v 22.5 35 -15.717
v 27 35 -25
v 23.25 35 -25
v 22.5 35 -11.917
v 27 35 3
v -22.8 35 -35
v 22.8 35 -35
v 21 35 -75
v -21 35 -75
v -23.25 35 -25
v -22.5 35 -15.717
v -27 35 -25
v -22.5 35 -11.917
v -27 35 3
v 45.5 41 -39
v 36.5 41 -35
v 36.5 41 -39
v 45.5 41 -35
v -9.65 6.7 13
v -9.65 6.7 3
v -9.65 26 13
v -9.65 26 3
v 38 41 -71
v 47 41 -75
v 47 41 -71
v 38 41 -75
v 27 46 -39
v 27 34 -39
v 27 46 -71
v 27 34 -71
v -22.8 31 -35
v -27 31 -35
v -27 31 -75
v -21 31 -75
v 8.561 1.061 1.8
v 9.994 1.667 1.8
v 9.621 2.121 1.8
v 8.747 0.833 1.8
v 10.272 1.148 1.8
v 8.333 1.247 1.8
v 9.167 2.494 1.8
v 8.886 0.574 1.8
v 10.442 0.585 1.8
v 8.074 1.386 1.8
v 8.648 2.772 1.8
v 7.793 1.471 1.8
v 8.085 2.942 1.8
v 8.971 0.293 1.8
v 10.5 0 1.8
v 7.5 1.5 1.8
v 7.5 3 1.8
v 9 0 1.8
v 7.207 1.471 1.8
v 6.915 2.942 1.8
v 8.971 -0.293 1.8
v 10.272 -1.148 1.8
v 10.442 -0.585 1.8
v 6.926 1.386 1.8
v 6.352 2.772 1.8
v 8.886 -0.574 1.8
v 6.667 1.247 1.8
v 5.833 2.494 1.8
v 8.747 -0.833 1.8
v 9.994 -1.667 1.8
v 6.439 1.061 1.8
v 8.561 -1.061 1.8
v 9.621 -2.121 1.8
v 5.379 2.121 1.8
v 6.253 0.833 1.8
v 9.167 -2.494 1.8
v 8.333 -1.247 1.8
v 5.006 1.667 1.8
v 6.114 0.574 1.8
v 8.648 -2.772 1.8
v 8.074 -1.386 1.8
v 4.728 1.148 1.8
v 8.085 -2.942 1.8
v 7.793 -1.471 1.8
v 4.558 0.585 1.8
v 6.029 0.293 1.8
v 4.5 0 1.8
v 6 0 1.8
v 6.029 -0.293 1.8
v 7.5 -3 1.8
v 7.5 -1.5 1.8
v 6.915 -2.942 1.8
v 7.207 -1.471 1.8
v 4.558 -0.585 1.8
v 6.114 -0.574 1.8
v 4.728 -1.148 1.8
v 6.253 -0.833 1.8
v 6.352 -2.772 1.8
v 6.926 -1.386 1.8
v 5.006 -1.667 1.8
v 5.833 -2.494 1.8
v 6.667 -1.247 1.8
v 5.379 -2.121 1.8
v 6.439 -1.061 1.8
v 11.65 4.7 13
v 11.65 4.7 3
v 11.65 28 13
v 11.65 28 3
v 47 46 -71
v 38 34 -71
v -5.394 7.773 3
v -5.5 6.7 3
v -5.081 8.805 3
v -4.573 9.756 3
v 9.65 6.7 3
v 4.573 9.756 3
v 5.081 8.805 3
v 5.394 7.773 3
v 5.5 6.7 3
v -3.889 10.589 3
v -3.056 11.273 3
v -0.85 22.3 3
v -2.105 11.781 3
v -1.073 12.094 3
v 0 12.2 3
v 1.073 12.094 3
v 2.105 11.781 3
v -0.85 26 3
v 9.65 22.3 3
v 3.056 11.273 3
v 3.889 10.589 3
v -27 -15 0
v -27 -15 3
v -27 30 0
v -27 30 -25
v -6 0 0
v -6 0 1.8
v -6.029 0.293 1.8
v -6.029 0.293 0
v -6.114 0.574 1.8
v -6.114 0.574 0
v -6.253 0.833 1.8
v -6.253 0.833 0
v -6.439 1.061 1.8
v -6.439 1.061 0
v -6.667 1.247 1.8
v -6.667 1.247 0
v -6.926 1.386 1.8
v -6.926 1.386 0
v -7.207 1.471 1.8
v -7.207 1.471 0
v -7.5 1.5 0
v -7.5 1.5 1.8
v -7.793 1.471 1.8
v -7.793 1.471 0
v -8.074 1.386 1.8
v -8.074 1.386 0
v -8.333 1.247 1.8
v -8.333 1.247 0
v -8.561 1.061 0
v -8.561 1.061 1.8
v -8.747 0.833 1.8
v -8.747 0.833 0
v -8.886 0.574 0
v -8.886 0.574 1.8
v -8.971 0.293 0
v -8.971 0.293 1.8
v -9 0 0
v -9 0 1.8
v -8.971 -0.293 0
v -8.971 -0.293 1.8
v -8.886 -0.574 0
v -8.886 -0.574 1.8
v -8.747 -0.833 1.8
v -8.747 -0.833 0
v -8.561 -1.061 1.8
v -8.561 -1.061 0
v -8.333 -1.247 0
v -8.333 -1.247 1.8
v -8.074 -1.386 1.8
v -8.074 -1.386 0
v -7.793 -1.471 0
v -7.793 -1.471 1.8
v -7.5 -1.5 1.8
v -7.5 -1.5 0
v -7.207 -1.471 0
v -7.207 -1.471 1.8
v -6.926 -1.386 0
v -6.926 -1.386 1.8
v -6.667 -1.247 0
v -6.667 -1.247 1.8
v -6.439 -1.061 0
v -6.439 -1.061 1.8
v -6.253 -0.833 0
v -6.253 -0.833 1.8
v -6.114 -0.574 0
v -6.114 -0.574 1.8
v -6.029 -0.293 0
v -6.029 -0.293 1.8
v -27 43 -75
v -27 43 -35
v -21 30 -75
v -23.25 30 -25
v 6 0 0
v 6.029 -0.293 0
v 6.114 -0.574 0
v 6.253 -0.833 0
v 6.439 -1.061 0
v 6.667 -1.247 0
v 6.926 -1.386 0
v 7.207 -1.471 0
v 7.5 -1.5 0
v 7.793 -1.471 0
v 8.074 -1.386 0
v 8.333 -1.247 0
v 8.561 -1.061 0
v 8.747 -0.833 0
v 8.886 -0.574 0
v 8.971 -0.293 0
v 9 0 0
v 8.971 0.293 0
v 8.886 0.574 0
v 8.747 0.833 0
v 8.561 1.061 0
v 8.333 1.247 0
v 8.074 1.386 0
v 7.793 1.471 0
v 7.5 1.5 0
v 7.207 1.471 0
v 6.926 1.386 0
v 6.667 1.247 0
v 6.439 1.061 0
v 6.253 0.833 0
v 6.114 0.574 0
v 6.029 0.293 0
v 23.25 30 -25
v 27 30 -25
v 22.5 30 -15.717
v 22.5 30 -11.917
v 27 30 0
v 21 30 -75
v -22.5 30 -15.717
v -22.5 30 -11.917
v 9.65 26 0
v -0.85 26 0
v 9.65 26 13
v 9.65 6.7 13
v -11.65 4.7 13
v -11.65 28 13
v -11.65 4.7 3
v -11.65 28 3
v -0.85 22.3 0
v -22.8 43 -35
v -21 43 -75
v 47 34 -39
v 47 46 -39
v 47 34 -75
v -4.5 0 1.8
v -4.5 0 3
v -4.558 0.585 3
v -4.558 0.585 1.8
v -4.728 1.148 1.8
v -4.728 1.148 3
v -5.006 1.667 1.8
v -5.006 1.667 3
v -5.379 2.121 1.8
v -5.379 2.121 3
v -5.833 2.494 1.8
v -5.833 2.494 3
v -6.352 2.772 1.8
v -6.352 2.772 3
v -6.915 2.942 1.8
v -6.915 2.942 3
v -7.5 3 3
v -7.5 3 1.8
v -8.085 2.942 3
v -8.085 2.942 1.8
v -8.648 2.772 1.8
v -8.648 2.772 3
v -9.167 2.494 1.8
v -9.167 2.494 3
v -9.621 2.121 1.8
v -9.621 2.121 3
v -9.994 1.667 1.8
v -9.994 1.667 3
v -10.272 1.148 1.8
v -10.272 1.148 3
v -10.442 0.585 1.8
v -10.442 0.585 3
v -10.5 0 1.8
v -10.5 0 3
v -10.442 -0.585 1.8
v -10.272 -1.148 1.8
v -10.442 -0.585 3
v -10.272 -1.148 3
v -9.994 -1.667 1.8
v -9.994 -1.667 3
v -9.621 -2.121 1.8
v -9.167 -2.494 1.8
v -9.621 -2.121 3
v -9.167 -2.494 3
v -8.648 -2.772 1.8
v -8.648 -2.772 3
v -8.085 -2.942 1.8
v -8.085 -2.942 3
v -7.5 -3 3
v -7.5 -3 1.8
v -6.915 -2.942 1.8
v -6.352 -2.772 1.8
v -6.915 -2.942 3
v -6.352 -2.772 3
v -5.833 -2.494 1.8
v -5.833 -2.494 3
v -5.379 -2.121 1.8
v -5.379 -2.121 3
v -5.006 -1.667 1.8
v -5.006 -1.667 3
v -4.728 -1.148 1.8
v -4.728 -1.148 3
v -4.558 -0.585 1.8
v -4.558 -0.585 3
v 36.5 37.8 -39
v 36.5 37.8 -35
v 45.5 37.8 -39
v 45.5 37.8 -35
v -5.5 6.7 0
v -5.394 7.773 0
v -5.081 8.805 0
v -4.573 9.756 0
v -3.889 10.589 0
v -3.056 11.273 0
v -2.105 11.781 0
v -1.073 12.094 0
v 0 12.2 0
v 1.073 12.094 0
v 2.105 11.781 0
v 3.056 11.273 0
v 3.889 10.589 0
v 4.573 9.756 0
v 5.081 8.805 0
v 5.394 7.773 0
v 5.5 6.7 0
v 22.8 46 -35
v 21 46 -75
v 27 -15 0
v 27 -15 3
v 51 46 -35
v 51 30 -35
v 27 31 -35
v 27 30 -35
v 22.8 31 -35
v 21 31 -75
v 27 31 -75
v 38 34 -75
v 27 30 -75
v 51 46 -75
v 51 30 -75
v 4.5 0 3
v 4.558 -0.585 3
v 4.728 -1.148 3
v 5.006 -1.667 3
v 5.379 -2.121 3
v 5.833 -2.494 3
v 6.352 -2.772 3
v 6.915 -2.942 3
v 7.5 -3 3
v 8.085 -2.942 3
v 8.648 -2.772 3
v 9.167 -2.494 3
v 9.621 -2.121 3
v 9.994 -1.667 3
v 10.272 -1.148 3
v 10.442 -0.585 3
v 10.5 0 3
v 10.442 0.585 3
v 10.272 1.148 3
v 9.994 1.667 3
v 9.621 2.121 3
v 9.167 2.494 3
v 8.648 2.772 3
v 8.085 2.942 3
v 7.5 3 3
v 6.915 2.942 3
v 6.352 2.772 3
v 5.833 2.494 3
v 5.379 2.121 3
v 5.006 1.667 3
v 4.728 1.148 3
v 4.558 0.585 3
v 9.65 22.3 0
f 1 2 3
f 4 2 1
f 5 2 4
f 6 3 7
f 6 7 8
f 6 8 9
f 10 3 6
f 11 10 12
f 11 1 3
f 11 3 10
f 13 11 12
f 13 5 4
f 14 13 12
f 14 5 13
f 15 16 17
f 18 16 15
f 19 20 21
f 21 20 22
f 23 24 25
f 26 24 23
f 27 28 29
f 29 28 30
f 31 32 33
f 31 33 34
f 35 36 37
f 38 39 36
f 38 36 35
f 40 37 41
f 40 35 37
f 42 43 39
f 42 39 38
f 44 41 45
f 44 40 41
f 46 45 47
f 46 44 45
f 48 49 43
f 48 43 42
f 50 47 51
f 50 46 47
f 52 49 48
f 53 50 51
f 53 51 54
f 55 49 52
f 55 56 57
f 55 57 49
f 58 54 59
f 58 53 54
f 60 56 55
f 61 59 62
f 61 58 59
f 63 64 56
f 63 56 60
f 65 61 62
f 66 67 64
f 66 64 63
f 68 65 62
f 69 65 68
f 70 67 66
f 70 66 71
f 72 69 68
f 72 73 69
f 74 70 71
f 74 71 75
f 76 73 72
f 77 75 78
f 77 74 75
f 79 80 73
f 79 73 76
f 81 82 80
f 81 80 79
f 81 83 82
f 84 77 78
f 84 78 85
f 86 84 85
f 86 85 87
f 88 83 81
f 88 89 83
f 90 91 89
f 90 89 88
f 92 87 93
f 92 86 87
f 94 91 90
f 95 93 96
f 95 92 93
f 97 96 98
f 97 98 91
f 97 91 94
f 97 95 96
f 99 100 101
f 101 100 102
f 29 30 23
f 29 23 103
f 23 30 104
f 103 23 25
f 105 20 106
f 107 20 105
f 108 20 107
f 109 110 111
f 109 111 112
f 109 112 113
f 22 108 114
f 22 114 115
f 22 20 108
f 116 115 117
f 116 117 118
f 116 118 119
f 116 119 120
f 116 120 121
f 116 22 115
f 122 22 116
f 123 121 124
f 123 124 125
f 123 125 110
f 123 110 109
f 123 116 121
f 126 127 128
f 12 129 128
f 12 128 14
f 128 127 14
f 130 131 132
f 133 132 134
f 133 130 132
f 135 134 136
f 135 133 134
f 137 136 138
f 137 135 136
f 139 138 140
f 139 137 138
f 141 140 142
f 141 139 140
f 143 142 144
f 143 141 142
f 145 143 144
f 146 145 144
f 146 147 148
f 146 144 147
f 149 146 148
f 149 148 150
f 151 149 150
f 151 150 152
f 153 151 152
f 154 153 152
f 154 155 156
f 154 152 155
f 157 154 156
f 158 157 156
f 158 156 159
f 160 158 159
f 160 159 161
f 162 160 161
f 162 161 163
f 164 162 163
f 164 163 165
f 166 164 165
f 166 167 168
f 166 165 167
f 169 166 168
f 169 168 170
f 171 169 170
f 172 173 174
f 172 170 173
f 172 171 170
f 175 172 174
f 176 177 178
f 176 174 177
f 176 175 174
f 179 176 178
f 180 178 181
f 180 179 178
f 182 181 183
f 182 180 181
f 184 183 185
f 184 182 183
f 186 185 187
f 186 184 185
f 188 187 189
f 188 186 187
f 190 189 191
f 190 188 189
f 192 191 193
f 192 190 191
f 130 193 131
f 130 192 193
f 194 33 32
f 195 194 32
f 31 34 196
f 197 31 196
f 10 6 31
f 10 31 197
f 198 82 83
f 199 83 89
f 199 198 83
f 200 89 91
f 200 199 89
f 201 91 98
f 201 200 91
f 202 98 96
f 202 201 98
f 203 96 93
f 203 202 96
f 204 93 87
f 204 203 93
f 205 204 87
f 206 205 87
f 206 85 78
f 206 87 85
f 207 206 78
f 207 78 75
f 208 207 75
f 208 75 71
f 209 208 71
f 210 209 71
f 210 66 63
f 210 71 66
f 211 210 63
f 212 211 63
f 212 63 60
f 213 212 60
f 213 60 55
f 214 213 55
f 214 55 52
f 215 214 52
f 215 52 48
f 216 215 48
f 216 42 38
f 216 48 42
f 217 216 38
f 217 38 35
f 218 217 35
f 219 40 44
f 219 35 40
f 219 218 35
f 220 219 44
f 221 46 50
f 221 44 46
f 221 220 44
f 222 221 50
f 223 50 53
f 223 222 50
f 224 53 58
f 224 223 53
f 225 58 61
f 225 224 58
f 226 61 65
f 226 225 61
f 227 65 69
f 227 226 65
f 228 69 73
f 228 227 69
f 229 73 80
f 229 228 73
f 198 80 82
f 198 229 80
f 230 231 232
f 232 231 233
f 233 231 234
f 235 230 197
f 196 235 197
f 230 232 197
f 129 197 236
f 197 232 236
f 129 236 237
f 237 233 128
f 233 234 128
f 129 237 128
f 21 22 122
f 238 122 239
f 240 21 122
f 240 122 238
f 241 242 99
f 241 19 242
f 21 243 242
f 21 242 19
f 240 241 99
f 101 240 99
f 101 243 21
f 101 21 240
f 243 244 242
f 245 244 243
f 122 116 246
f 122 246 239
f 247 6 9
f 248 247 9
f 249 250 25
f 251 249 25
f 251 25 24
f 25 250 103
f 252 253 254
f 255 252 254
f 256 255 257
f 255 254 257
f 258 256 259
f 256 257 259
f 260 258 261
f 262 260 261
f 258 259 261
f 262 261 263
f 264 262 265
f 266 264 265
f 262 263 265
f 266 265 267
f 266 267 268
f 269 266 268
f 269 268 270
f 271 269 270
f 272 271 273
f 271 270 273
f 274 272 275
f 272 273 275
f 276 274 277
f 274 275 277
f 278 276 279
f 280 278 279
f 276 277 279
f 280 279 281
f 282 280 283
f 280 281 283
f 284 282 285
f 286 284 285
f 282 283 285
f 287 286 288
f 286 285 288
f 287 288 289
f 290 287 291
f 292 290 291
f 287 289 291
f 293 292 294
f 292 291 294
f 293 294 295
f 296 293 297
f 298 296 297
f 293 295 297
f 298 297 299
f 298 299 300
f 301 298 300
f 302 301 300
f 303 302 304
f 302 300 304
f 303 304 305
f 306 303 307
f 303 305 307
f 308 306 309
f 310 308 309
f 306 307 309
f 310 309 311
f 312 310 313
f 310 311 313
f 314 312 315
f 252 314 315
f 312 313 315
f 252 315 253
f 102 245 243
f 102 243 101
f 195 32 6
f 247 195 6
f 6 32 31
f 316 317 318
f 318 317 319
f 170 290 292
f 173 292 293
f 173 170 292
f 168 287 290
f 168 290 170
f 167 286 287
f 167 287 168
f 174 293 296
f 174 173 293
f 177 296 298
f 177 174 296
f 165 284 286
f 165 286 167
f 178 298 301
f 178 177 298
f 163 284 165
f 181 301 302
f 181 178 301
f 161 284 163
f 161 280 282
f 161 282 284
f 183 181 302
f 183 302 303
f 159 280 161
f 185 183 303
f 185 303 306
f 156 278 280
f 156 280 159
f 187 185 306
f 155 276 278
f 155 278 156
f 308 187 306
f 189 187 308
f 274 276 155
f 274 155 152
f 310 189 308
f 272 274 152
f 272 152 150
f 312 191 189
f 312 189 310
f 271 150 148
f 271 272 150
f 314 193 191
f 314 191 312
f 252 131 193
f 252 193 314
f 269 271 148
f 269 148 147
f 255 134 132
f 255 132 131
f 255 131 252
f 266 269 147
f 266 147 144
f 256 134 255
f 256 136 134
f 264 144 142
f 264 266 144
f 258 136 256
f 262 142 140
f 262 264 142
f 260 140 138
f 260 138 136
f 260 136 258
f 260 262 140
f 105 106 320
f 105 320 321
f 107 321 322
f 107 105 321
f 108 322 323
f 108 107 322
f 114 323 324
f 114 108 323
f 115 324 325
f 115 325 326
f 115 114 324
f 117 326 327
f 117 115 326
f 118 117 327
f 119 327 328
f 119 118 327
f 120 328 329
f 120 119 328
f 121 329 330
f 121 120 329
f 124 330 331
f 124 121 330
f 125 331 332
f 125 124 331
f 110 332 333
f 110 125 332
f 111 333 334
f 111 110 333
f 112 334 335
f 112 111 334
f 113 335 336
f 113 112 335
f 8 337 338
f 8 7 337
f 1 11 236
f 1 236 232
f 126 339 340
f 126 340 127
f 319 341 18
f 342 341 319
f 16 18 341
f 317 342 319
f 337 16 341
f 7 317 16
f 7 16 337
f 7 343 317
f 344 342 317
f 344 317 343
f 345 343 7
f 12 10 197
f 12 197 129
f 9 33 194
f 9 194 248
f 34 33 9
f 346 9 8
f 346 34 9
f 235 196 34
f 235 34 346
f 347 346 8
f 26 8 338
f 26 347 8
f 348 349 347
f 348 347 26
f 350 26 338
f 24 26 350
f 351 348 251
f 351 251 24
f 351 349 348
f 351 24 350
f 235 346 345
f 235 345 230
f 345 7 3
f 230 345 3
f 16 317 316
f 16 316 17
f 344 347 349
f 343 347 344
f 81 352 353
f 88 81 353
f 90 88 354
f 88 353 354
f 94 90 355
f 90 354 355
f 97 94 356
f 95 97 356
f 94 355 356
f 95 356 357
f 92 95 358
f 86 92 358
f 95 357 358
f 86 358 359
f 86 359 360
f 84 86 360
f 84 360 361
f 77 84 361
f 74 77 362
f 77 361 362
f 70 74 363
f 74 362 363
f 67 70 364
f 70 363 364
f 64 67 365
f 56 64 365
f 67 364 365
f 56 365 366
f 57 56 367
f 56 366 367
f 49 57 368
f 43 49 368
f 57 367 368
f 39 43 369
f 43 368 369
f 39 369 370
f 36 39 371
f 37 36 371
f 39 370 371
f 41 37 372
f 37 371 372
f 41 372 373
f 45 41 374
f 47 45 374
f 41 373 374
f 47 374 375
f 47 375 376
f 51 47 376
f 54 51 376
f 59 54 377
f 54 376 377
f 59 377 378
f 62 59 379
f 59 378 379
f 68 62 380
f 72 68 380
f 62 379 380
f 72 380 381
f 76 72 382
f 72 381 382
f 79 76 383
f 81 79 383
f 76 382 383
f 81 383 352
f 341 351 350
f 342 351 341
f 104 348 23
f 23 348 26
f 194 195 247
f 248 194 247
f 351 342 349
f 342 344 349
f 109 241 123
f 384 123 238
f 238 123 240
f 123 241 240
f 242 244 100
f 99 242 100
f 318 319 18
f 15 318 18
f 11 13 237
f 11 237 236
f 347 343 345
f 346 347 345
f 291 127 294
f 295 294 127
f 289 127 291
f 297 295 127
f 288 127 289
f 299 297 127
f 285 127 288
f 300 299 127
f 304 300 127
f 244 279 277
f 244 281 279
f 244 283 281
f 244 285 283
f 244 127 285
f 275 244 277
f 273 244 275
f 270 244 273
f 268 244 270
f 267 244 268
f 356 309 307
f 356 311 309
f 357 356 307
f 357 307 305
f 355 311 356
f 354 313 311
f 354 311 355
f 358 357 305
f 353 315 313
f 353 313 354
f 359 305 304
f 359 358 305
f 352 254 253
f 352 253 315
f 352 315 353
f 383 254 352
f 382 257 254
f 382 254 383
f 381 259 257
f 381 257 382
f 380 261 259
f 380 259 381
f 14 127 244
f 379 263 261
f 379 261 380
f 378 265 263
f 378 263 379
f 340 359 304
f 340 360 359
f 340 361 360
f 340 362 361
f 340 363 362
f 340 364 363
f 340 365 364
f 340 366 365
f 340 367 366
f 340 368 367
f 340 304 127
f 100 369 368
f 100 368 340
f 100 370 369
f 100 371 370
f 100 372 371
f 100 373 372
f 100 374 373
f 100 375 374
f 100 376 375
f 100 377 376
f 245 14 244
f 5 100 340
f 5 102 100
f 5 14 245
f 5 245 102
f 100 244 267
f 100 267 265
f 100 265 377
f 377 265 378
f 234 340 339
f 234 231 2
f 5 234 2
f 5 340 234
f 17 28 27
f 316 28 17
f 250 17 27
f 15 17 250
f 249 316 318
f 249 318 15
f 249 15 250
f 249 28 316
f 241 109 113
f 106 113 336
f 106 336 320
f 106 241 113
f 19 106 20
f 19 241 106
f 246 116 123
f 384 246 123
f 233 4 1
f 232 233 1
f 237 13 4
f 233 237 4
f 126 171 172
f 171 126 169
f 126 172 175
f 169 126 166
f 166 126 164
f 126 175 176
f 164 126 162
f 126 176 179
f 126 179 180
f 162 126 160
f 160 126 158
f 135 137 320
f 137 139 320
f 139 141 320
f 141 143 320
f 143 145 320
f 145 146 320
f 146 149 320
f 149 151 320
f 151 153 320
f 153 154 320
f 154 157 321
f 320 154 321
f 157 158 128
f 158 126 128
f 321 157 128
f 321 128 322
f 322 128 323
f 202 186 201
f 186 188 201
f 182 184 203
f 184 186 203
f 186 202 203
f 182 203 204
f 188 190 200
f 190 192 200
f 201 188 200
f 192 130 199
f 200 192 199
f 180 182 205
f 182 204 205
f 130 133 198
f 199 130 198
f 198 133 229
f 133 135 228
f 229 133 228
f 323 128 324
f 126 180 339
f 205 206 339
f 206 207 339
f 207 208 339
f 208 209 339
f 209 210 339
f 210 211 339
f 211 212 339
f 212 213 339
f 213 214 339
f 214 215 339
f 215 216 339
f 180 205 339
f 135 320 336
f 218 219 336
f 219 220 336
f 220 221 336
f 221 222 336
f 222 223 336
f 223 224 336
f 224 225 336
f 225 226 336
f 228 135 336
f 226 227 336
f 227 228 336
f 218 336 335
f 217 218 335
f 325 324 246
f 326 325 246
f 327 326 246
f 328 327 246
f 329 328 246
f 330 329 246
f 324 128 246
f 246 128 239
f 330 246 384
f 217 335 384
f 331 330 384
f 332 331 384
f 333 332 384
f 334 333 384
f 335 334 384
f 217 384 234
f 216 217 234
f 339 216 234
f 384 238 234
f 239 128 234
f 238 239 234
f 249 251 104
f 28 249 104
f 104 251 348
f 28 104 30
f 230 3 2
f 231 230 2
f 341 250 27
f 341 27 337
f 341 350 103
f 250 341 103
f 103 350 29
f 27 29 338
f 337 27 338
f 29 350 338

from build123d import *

# Parameters (mm, degrees)
CROQUIS1_W                   = 54
CROQUIS1_H                   = 70
CROQUIS1_R                   = 1.5
SALIENTE_EXTRUIR1_DEPTH      = 3
CROQUIS2_R                   = 3
CORTAR_EXTRUIR1_DEPTH        = 1.2
CROQUIS3_W                   = 23.3
CROQUIS3_H                   = 23.3
CROQUIS3_W_2                 = 19.3
CROQUIS3_H_2                 = 19.3
SALIENTE_EXTRUIR2_DEPTH      = 10
CROQUIS4_W                   = 54
CROQUIS4_H                   = 5
SALIENTE_EXTRUIR3_DEPTH      = 75
CROQUIS6_W                   = 54
CROQUIS6_H                   = 20
CORTAR_EXTRUIR2_DEPTH        = 3
CORTAR_EXTRUIR4_DEPTH        = 5
CROQUIS8_W                   = 45
CROQUIS8_H                   = 3.8
CORTAR_EXTRUIR5_DEPTH        = 5
CROQUIS9_W                   = 10.5
CROQUIS9_H                   = 3.7
CORTAR_EXTRUIR6_DEPTH        = 3
SALIENTE_EXTRUIR4_DEPTH      = 8
SALIENTE_EXTRUIR4_DEPTH_BACK = 4
SALIENTE_EXTRUIR5_DEPTH      = 20
CROQUIS12_W                  = 9
CROQUIS12_H                  = 7
CORTAR_EXTRUIR7_DEPTH        = 4
CROQUIS13_W                  = 40
CROQUIS13_H                  = 13
SALIENTE_EXTRUIR6_DEPTH      = 4
CROQUIS16_W                  = 9
CROQUIS16_H                  = 3.2
CORTAR_EXTRUIR9_DEPTH        = 4
CROQUIS17_W                  = 20
CROQUIS17_H                  = 32
SALIENTE_EXTRUIR7_DEPTH      = 3


with BuildPart() as part:
    # Croquis1 → Saliente-Extruir1 (new body)
    with BuildSketch(Plane.XY):
        Rectangle(CROQUIS1_W, CROQUIS1_H)
        with Locations((-7.5, 0)):
            Circle(CROQUIS1_R, mode=Mode.SUBTRACT)
        with Locations(Location((7.5, 0, 0), (0, 0, 180))):
            Circle(CROQUIS1_R, mode=Mode.SUBTRACT)
    extrude(amount=SALIENTE_EXTRUIR1_DEPTH)

    # Croquis2 → Cortar-Extruir1 (cut)
    with BuildSketch(Plane.XY.offset(3)):
        with Locations((-7.5, 0)):
            Circle(CROQUIS2_R)
        with Locations(Location((7.5, 0, 0), (0, 0, 180))):
            Circle(CROQUIS2_R)
    extrude(amount=-CORTAR_EXTRUIR1_DEPTH, mode=Mode.SUBTRACT)

    # Croquis3 → Saliente-Extruir2 (add)
    with BuildSketch(Plane.XY.offset(3)):
        with Locations((0, 16.35)):
            Rectangle(CROQUIS3_W, CROQUIS3_H)
        with Locations((0, 16.35)):
            Rectangle(CROQUIS3_W_2, CROQUIS3_H_2, mode=Mode.SUBTRACT)
    extrude(amount=SALIENTE_EXTRUIR2_DEPTH)

    # Croquis4 → Saliente-Extruir3 (add)
    with BuildSketch(Plane(origin=(0, 0, 0), x_dir=(-1, 0, 0), z_dir=(0, 0, -1))):
        with Locations((0, 32.5)):
            Rectangle(CROQUIS4_W, CROQUIS4_H)
    extrude(amount=SALIENTE_EXTRUIR3_DEPTH)

    # Croquis6 → Cortar-Extruir2 (cut)
    with BuildSketch(Plane(origin=(0, 0, 0), x_dir=(-1, 0, 0), z_dir=(0, 0, -1))):
        with Locations((0, -25)):
            Rectangle(CROQUIS6_W, CROQUIS6_H)
    extrude(amount=-CORTAR_EXTRUIR2_DEPTH, mode=Mode.SUBTRACT)

    # Croquis7 → Cortar-Extruir4 (cut)
    with BuildSketch(Plane(origin=(0, 35, 0), x_dir=(1, 0, 0), z_dir=(0, 1, 0))):
        Polygon((-27, 75), (-21, 75), (-23.25, 25), (-27, 25), align=None)
        Polygon((23.25, 25), (27, 25), (27, 75), (21, 75), align=None)
    extrude(amount=-CORTAR_EXTRUIR4_DEPTH, mode=Mode.SUBTRACT)

    # Croquis8 → Cortar-Extruir5 (cut)
    with BuildSketch(Plane(origin=(0, 35, 0), x_dir=(1, 0, 0), z_dir=(0, 1, 0))):
        with Locations((0, 13.816893204)):
            Rectangle(CROQUIS8_W, CROQUIS8_H)
    extrude(amount=-CORTAR_EXTRUIR5_DEPTH, mode=Mode.SUBTRACT)

    # Croquis9 → Cortar-Extruir6 (cut)
    with BuildSketch(Plane.XY.offset(3)):
        with Locations((4.4, 24.15)):
            Rectangle(CROQUIS9_W, CROQUIS9_H)
        with BuildLine():
            Line((5.5, 6.7), (-5.5, 6.7))
            ThreePointArc((-5.5, 6.7), (0, 12.2), (5.5, 6.7))
        make_face()
    extrude(amount=-CORTAR_EXTRUIR6_DEPTH, mode=Mode.SUBTRACT)

    # Croquis10 → Saliente-Extruir4 (add, two sides: drawn at the far end of the back side and taken through both)
    with BuildSketch(Plane(origin=(0, 35, 0), x_dir=(1, 0, 0), z_dir=(0, 1, 0)).offset(-SALIENTE_EXTRUIR4_DEPTH_BACK)):
        Polygon((-21, 75), (-27, 75), (-27, 35), (-22.8, 35), align=None)
        Polygon((27, 35), (22.8, 35), (21, 75), (27, 75), align=None)
    extrude(amount=SALIENTE_EXTRUIR4_DEPTH + SALIENTE_EXTRUIR4_DEPTH_BACK)

    # Croquis11 → Saliente-Extruir5 (add)
    with BuildSketch(Plane(origin=(27, 0, 0), x_dir=(0, 0, -1), z_dir=(1, 0, 0))):
        Polygon((35, 43), (39, 43), (39, 34), (71, 34), (71, 43), (75, 43), (75, 30), (35, 30), align=None)
    extrude(amount=SALIENTE_EXTRUIR5_DEPTH)

    # Croquis12 → Cortar-Extruir7 (cut)
    with BuildSketch(Plane(origin=(0, 0, -75), x_dir=(-1, 0, 0), z_dir=(0, 0, -1))):
        with Locations((-42.5, 37.5)):
            Rectangle(CROQUIS12_W, CROQUIS12_H)
    extrude(amount=-CORTAR_EXTRUIR7_DEPTH, mode=Mode.SUBTRACT)

    # Croquis13 → Saliente-Extruir6 (add)
    with BuildSketch(Plane(origin=(47, 0, 0), x_dir=(0, 0, -1), z_dir=(1, 0, 0))):
        with Locations((55, 36.5)):
            Rectangle(CROQUIS13_W, CROQUIS13_H)
    extrude(amount=SALIENTE_EXTRUIR6_DEPTH)

    # Croquis16 → Cortar-Extruir9 (cut)
    with BuildSketch(Plane.XY.offset(-35)):
        with Locations((41, 39.4)):
            Rectangle(CROQUIS16_W, CROQUIS16_H)
    extrude(amount=-CORTAR_EXTRUIR9_DEPTH, mode=Mode.SUBTRACT)

    # Croquis17 → Saliente-Extruir7 (add)
    with BuildSketch(Plane(origin=(0, 43, 0), x_dir=(1, 0, 0), z_dir=(0, 1, 0))):
        Polygon((21, 75), (51, 75), (51, 35), (22.8, 35), align=None)
        with Locations((37, 55)):
            Rectangle(CROQUIS17_W, CROQUIS17_H, mode=Mode.SUBTRACT)
    extrude(amount=SALIENTE_EXTRUIR7_DEPTH)


solid = part.part
